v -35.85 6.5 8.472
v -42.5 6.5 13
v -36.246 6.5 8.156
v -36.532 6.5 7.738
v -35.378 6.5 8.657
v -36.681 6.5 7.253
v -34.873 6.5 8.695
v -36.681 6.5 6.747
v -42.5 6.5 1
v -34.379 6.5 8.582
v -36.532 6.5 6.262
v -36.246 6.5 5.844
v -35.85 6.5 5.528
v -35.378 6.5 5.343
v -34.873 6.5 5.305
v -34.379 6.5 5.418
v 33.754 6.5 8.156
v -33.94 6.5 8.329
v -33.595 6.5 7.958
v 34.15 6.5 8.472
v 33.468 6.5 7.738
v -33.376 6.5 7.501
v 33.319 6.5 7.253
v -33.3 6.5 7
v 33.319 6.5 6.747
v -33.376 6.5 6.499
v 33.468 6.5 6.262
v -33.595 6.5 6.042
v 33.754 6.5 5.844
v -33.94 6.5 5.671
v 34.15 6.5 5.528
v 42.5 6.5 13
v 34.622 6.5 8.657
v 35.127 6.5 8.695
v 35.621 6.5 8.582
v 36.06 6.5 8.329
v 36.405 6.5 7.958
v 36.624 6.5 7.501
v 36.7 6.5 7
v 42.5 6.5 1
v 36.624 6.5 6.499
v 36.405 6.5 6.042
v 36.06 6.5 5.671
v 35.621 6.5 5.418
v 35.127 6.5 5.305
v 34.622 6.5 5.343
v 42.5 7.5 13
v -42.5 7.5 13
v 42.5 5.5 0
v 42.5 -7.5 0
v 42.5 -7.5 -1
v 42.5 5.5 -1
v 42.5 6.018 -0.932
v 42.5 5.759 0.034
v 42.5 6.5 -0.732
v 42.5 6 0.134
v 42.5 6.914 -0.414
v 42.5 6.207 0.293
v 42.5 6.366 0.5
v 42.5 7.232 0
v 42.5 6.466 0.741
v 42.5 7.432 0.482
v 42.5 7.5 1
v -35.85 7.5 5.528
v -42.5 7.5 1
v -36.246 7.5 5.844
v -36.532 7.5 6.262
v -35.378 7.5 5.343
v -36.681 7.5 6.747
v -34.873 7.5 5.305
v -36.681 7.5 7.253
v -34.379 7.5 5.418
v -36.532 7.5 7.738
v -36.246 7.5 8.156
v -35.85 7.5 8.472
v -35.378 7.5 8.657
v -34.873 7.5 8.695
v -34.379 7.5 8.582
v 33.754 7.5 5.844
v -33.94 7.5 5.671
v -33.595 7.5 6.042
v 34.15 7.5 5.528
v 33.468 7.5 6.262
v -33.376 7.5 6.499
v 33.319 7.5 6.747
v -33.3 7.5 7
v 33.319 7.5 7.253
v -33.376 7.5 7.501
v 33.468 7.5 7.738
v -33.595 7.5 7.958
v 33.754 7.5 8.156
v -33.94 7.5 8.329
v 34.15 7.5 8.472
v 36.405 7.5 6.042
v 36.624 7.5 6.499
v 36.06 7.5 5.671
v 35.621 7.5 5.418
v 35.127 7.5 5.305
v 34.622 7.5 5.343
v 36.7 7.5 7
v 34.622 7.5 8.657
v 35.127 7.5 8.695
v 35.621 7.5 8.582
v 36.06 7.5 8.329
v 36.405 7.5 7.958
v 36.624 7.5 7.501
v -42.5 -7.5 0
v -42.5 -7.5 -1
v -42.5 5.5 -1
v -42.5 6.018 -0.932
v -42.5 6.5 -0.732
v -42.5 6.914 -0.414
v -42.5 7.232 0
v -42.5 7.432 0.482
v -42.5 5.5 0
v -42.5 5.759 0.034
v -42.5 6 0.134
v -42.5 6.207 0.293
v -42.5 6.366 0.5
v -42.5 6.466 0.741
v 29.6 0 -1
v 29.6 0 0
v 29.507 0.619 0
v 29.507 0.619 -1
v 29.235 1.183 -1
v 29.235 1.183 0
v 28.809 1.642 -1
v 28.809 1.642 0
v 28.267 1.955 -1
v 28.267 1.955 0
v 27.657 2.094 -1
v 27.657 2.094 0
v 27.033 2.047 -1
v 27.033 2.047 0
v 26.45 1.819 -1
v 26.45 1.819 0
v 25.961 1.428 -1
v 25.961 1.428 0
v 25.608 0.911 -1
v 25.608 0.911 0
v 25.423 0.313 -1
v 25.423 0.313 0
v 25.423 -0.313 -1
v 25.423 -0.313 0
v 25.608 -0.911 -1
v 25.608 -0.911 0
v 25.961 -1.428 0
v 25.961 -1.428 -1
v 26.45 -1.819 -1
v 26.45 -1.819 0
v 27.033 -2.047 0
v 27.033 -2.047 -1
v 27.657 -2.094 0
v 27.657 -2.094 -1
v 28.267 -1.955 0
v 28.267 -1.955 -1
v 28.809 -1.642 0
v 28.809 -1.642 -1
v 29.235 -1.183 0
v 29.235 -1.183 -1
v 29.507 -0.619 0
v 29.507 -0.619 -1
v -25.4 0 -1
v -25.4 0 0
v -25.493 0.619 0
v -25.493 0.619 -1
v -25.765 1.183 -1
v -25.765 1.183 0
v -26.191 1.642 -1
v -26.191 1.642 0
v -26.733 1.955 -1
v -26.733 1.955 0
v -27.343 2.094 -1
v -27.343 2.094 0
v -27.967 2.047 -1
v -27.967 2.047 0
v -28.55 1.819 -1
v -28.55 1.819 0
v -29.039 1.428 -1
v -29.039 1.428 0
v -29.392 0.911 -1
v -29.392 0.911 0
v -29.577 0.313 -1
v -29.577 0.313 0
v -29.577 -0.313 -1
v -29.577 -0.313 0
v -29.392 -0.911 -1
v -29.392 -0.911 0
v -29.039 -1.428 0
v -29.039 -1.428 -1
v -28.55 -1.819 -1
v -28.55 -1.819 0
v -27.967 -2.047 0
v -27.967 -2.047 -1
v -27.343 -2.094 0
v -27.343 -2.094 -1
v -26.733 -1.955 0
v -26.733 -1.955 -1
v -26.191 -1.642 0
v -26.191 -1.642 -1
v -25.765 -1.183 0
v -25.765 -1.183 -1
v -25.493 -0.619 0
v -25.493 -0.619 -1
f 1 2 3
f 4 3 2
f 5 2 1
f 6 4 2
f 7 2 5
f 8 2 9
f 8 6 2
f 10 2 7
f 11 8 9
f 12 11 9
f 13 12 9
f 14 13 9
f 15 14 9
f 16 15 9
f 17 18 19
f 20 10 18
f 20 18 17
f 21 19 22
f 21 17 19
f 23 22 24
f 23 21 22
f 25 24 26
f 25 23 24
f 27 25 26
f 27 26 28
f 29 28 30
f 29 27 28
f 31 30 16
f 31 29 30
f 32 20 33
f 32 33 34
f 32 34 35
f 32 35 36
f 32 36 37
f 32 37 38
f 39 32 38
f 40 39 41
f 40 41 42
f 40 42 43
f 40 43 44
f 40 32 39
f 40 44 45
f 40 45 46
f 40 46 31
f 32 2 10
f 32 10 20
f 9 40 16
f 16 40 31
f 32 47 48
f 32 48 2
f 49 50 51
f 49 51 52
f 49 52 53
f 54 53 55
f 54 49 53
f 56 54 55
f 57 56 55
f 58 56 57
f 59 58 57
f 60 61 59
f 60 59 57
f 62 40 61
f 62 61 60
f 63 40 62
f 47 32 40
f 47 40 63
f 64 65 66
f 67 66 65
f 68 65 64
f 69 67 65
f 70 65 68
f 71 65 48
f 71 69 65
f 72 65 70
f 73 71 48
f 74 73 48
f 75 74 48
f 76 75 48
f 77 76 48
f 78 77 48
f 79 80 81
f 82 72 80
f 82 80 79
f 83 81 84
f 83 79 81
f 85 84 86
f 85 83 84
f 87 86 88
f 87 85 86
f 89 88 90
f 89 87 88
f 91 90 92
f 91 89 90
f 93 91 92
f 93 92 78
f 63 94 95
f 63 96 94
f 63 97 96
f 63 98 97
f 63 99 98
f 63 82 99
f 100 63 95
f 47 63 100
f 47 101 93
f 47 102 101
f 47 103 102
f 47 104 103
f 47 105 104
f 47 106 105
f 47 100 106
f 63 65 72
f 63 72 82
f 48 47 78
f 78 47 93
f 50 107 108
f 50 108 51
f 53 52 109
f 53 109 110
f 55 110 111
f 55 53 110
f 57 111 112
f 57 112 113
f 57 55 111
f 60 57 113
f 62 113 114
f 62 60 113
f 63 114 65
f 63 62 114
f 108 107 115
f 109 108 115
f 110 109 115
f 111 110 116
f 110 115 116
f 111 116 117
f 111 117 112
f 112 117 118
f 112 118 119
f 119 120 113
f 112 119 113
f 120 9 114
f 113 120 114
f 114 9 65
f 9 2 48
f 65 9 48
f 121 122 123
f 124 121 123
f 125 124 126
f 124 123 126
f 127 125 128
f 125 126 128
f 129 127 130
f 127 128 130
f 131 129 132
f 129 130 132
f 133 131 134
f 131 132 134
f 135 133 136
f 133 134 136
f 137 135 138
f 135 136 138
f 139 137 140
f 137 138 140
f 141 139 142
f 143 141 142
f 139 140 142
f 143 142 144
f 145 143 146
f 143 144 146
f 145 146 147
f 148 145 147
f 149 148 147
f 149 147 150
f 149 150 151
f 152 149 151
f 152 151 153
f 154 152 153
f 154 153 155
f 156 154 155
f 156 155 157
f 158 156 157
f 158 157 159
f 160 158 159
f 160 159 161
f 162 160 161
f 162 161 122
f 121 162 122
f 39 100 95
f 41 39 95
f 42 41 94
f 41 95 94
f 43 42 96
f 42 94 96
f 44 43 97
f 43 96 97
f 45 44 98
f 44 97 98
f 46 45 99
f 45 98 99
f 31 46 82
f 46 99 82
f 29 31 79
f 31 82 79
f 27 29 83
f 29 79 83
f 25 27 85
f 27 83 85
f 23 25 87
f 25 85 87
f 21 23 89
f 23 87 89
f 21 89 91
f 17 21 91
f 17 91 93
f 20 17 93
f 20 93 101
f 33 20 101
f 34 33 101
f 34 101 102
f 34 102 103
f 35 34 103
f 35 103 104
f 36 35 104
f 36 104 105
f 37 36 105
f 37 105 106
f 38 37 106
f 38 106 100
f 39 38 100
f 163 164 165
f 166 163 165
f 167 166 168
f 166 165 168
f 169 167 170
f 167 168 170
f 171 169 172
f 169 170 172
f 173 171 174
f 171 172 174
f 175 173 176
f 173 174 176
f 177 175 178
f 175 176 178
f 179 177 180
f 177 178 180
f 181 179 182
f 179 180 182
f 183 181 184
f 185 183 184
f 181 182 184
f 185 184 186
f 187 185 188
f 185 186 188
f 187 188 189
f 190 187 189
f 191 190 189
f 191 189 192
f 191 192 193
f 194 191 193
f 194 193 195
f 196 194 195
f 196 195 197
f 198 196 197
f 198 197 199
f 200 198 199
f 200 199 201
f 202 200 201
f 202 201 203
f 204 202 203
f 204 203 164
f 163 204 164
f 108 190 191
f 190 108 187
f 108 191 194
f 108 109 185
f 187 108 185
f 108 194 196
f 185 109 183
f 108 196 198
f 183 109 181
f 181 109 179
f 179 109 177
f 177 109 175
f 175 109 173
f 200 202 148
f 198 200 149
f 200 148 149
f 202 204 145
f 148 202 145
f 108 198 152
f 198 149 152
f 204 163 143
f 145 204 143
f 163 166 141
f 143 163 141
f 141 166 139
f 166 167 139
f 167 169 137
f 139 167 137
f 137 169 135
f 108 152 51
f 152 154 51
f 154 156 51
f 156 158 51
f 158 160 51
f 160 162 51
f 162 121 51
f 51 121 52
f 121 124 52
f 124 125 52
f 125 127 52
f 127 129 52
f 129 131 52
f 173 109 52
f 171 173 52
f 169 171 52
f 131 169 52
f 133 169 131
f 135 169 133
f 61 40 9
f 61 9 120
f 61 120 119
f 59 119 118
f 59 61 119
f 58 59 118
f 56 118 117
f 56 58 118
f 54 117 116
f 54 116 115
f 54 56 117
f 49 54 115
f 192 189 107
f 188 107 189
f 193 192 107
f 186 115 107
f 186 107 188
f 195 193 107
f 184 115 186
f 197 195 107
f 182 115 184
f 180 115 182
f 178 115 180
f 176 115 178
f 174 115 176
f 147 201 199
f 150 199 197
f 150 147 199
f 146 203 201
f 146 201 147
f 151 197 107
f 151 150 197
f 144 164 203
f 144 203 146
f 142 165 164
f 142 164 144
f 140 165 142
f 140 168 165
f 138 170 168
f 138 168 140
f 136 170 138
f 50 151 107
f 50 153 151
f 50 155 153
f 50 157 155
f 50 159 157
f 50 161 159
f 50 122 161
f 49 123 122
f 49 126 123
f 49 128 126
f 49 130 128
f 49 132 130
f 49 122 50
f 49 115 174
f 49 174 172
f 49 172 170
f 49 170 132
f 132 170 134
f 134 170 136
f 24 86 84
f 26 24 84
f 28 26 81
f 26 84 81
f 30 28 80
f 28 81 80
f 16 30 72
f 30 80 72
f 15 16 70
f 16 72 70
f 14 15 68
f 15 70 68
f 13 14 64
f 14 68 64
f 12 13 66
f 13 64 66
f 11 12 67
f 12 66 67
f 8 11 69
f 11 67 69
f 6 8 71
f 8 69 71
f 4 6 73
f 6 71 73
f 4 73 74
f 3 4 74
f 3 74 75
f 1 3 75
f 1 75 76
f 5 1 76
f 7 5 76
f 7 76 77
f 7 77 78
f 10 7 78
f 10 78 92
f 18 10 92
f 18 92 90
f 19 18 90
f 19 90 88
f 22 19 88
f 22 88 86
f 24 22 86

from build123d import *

# Parameters (mm, degrees)
SKETCH_1_W                       = 85
SKETCH_1_H                       = 15
SM_BASE_FLANGE_1_DEPTH           = 1
SM_EDGE_FLANGE_1_STRIP_W         = 6
SM_EDGE_FLANGE_1_STRIP_H         = 1
SM_EDGE_FLANGE_1_STRIP_CUT_DEPTH = 85
SM_EDGE_FLANGE_1_DEPTH           = 85
SKETCH_9_R                       = 2.1
CUT_EXTRUDE_1_DEPTH              = 10
HOLE_WIZARD_M31_D                = 3.4
HOLE_WIZARD_M31_DEPTH            = 18.5
HOLE_WIZARD_M31_TIP              = 1.021463052


# Sheet-metal steps are written as plain solids
with BuildPart() as part:
    # Sketch 1 → Базовая кромка1 (new body)
    with BuildSketch(Plane.XY):
        Rectangle(SKETCH_1_W, SKETCH_1_H)
    extrude(amount=-SM_BASE_FLANGE_1_DEPTH)

    # Ребро-кромка1 strip (across the edge) → Ребро-кромка1 strip cut (cut)
    with BuildSketch(Plane(origin=(42.5, 7.5, 0), x_dir=(0, -1, 0), z_dir=(-1, 0, 0))):
        with Locations((-1, -0.5)):
            Rectangle(SM_EDGE_FLANGE_1_STRIP_W, SM_EDGE_FLANGE_1_STRIP_H)
    extrude(amount=SM_EDGE_FLANGE_1_STRIP_CUT_DEPTH, mode=Mode.SUBTRACT)

    # Ребро-кромка1 section (across the edge) → Ребро-кромка1 (add)
    with BuildSketch(Plane(origin=(42.5, 7.5, 0), x_dir=(0, -1, 0), z_dir=(-1, 0, 0))):
        with BuildLine():
            Line((0, 1), (0, 13))
            Line((0, 13), (1, 13))
            Line((1, 13), (1, 1))
            ThreePointArc((1, 1), (1.292893219, 0.292893219), (2, 0))
            Line((2, 0), (2, -1))
            ThreePointArc((2, -1), (0.585786438, -0.414213562), (0, 1))
        make_face()
    extrude(amount=SM_EDGE_FLANGE_1_DEPTH)

    # Эскиз9 → Вырез-Вытянуть1 (cut)
    with BuildSketch(Plane.XY):
        with Locations((-27.5, 0)):
            Circle(SKETCH_9_R)
        with Locations((27.5, 0)):
            Circle(SKETCH_9_R)
    extrude(amount=-CUT_EXTRUDE_1_DEPTH, mode=Mode.SUBTRACT)

    # Отверстие с зазором M31
    with Locations(Plane(origin=(0, 6.5, 0), x_dir=(-1, 0, 0), z_dir=(0, -1, 0))):
        with Locations((-35, -7), (35, -7)):
            Hole(HOLE_WIZARD_M31_D / 2, depth=HOLE_WIZARD_M31_DEPTH)
            with Locations((0, 0, -(HOLE_WIZARD_M31_DEPTH + HOLE_WIZARD_M31_TIP / 2))):  # 118° drill point
                Cone(0, HOLE_WIZARD_M31_D / 2, HOLE_WIZARD_M31_TIP, mode=Mode.SUBTRACT)


solid = part.part
